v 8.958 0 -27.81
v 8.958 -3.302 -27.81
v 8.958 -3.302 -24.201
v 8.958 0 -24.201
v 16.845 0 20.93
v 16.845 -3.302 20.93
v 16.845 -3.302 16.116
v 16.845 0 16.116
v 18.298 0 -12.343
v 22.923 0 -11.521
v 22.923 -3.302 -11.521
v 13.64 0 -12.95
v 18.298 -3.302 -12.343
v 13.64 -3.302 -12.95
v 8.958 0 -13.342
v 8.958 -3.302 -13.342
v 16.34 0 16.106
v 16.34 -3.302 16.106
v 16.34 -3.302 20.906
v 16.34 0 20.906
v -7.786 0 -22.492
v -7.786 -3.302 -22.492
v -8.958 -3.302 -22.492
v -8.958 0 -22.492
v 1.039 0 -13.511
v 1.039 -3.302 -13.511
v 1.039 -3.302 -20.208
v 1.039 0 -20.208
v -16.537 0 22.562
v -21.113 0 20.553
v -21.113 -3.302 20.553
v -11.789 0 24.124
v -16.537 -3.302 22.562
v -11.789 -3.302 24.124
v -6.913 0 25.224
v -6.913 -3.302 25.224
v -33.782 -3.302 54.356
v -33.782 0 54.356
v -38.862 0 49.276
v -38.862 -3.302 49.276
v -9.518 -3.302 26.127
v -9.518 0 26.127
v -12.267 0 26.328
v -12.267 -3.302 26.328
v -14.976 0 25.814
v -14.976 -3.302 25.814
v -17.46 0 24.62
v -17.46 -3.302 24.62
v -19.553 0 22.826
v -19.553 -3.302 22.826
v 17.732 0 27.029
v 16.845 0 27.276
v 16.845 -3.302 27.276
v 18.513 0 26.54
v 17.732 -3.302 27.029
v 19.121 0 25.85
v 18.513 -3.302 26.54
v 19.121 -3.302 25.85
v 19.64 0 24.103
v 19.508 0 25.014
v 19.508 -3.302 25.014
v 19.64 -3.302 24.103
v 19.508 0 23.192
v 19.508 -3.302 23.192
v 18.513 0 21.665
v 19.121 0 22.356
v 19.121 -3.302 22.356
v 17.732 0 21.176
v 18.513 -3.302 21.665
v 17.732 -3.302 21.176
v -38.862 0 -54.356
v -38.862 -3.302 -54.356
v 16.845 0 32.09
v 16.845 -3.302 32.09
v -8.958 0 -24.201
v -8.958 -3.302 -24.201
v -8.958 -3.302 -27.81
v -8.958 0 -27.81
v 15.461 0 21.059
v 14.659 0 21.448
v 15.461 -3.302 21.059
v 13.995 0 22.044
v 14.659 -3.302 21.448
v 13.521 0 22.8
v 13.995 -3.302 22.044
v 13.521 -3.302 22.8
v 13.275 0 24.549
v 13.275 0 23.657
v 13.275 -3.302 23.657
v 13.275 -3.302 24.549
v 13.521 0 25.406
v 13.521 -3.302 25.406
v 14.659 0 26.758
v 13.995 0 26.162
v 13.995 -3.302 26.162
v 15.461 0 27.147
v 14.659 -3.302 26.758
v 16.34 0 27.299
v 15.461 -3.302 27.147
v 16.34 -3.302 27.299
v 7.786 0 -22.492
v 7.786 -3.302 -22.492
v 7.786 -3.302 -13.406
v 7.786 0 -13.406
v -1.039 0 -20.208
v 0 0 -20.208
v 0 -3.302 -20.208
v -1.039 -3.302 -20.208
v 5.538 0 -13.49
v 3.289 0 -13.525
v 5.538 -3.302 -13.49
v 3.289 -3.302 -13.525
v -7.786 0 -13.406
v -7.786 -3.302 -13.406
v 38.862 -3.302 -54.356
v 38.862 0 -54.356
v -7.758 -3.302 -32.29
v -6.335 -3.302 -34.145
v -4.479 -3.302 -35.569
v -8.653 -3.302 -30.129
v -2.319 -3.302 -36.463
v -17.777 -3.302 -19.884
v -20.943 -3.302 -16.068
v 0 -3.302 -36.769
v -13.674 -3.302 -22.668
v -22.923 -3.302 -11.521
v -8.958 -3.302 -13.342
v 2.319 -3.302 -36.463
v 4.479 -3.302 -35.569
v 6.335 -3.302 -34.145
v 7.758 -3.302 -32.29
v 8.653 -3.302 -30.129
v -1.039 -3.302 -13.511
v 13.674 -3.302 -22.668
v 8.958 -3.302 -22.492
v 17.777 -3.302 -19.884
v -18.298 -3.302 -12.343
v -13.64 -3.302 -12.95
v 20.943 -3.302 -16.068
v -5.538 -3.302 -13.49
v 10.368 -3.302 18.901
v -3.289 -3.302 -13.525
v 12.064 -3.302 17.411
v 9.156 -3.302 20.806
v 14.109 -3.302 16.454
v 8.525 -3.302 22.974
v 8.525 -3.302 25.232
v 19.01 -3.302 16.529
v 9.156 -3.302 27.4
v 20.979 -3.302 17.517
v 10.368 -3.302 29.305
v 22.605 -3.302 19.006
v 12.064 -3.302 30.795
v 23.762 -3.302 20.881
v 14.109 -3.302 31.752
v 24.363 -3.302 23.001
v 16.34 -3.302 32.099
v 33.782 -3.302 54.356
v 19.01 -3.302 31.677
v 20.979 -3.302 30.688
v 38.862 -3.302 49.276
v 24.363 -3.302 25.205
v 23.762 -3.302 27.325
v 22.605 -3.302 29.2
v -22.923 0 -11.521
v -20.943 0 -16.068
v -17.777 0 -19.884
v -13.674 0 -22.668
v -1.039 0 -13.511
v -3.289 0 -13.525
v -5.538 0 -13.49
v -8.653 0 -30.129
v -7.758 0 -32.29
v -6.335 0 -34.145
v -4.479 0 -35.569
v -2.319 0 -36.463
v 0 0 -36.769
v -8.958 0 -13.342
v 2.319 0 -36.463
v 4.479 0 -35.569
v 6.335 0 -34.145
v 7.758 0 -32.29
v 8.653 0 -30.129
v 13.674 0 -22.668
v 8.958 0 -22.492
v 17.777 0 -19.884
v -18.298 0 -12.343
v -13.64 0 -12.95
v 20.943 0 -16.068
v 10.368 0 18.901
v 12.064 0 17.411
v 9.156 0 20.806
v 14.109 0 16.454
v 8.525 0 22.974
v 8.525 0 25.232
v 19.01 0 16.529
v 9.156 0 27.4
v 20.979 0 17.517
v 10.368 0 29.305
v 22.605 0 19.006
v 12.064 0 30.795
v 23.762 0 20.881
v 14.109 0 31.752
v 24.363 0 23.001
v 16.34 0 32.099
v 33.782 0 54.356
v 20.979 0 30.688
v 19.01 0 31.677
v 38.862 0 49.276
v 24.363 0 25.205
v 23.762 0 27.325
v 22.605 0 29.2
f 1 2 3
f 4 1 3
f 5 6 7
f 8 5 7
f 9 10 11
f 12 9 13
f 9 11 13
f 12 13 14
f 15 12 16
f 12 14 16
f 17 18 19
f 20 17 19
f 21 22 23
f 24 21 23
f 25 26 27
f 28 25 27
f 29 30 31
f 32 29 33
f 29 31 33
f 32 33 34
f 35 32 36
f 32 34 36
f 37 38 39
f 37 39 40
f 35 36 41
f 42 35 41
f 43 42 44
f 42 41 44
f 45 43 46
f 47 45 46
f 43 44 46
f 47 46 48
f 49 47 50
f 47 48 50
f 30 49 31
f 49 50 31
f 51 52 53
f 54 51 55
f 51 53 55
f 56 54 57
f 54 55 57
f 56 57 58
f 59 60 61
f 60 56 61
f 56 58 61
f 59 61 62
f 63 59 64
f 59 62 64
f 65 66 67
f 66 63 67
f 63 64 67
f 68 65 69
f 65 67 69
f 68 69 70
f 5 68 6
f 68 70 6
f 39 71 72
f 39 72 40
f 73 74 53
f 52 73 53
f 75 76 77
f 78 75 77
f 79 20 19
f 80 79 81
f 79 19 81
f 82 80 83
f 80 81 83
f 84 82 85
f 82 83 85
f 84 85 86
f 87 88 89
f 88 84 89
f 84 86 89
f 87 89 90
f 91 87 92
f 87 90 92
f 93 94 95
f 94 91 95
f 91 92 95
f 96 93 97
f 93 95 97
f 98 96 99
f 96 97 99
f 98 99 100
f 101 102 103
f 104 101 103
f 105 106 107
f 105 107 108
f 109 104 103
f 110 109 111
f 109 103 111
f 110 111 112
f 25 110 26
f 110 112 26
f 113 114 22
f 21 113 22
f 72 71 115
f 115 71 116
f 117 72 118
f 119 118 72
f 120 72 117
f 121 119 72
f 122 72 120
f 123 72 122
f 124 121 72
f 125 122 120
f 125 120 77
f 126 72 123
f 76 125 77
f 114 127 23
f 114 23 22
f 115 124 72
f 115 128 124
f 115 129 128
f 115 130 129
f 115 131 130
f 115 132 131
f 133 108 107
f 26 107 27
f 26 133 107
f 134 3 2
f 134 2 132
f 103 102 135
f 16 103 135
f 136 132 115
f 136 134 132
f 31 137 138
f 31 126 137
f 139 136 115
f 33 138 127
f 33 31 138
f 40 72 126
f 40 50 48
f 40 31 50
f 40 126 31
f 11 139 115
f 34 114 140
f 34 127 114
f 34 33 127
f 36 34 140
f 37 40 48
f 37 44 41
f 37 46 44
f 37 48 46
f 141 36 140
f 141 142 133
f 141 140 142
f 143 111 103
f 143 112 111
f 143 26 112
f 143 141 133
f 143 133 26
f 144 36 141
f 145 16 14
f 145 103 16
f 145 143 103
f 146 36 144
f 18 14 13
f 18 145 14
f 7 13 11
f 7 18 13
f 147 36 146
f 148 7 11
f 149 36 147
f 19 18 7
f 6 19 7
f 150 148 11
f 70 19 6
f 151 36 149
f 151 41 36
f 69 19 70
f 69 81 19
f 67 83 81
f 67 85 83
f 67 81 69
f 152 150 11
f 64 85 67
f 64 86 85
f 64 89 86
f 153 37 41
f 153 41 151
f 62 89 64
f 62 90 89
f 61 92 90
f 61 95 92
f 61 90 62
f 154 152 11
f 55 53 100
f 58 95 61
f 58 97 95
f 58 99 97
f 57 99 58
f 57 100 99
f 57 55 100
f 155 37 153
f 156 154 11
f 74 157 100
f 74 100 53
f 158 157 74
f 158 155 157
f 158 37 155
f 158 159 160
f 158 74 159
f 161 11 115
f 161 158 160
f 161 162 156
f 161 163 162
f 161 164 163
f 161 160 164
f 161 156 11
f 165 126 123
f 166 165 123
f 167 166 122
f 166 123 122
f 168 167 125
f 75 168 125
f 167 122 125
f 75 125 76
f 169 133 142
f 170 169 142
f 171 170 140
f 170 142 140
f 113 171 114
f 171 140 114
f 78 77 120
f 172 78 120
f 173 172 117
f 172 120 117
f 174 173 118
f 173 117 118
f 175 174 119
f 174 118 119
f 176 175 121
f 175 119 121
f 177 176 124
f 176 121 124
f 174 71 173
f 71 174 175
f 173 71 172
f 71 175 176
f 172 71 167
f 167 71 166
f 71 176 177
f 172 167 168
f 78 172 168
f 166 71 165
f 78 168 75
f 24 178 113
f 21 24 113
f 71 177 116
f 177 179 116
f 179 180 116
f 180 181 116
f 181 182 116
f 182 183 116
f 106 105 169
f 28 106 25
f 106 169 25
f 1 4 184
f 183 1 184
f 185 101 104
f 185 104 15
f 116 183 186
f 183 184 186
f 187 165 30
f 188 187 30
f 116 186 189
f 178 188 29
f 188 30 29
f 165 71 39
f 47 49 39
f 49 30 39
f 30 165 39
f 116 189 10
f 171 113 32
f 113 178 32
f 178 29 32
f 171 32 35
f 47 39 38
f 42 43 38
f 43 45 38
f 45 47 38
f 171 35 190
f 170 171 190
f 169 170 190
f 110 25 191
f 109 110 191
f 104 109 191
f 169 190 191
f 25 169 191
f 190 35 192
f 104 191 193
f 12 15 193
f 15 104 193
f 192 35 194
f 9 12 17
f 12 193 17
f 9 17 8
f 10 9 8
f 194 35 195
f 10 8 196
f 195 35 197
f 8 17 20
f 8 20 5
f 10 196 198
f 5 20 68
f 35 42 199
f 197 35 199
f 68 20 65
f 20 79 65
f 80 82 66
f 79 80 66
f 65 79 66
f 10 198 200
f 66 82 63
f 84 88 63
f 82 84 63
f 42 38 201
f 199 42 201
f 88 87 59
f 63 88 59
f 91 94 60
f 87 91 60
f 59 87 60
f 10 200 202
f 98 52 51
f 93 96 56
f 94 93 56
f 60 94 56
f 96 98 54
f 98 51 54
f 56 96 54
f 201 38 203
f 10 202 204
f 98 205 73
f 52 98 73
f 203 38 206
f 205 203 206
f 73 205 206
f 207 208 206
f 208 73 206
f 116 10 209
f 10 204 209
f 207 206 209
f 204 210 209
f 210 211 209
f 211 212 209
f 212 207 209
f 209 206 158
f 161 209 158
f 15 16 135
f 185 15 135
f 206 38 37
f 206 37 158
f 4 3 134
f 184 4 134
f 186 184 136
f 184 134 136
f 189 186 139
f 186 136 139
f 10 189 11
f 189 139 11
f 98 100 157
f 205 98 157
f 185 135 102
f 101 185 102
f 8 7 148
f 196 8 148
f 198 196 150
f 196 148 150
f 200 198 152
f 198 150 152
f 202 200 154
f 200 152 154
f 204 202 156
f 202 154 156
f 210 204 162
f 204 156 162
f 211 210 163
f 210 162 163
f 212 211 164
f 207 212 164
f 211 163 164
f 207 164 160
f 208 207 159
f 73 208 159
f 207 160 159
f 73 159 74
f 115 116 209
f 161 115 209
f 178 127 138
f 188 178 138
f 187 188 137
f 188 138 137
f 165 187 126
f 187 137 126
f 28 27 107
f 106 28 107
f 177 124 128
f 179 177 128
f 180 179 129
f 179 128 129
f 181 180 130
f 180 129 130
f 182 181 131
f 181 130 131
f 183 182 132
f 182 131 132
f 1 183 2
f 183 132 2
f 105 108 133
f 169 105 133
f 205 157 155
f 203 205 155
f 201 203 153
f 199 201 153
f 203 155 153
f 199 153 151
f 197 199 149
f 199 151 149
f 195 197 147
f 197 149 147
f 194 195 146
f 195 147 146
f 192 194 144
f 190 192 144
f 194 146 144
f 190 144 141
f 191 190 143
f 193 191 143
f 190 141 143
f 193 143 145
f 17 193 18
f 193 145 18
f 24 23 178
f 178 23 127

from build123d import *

# Parameters (mm, degrees)
F0_W     = 77.724
F0_H     = 108.712
F1_DEPTH = 3.302
F3_R     = 13.3445871966
F4_DEPTH = 3.302
F5_SIZE  = 5.08
F7_DEPTH = 3.303


with BuildPart() as f1:
    # F0 (on Front) → F1 (new body)
    with BuildSketch(Plane.XZ):
        Rectangle(F0_W, F0_H)
    extrude(amount=F1_DEPTH)

    # F3 (on face) → F4 (join)
    with BuildSketch(Plane.XZ.offset(3.302)):
        with BuildLine():
            add(Edge.make_bspline(
                [(-33.1284857231, -24.3833554431), (-30.3980902484, -23.448268281), (-27.6625298974, -23.0135580616), (-24.9168122419, -22.8877504962)],
                knots=[0.0236239796, 0.0236239796, 0.0236239796, 0.0236239796, 0.1438563975, 0.1438563975, 0.1438563975, 0.1438563975], degree=3))
            ThreePointArc((-33.1284857231, -24.3833554431), (-29.1410849834, -38.4326879001), (-15.8749999992, -44.5395771521))
            ThreePointArc((-15.8749999992, -44.5395771521), (-7.7803065213, -45.3411097626), (9e-10, -47.7145771515))
            ThreePointArc((9e-10, -47.7145771515), (7.780306523, -45.3411097624), (15.8750000008, -44.5395771515))
            ThreePointArc((15.8750000008, -44.5395771515), (28.9710149024, -38.6284104056), (33.2008619827, -24.8968448621))
            add(Edge.make_bspline(
                [(22.7832318895, -28.264905571), (26.870414184, -28.3483991479), (30.7081117423, -27.7740633769), (33.2008619827, -24.8968448621)],
                knots=[0.8224951004, 0.8224951004, 0.8224951004, 0.8224951004, 0.9908039431, 0.9908039431, 0.9908039431, 0.9908039431], degree=3))
            add(Edge.make_bspline(
                [(15.9953683619, -27.7933645546), (16.7598950609, -27.862629463), (19.0104314318, -28.0581684328), (21.3052242348, -28.2347126075), (22.7832318895, -28.264905571)],
                knots=[0.7300371536, 0.7300371536, 0.7300371536, 0.7300371536, 0.7616312241, 0.8224951004, 0.8224951004, 0.8224951004, 0.8224951004], degree=3))
            add(Edge.make_bspline(
                [(12.0445173218, -27.4086319137), (13.3501324037, -27.5450763369), (14.6659309282, -27.6729196282), (15.9953683619, -27.7933645546)],
                knots=[0.6750981435, 0.6750981435, 0.6750981435, 0.6750981435, 0.7300371536, 0.7300371536, 0.7300371536, 0.7300371536], degree=3))
            add(Edge.make_bspline(
                [(6.5035843618, -26.7679947406), (8.3365045469, -27.0014140297), (10.1801283043, -27.2137923413), (12.0445173218, -27.4086319137)],
                knots=[0.5966464709, 0.5966464709, 0.5966464709, 0.5966464709, 0.6750981435, 0.6750981435, 0.6750981435, 0.6750981435], degree=3))
            add(Edge.make_bspline(
                [(-15.7821923495, -23.3437299796), (-10.5480047667, -23.9624284424), (-3.1004870846, -25.4363431139), (4.3262408996, -26.490713729), (6.5035843618, -26.7679947406)],
                knots=[0.2765511336, 0.2765511336, 0.2765511336, 0.2765511336, 0.5034529768, 0.5966464709, 0.5966464709, 0.5966464709, 0.5966464709], degree=3))
            add(Edge.make_bspline(
                [(-24.9168122419, -22.8877504962), (-22.5127229742, -22.777596192), (-19.4725911361, -22.9372512735), (-16.4147628171, -23.2689580365), (-15.7821923495, -23.3437299796)],
                knots=[0.1438563975, 0.1438563975, 0.1438563975, 0.1438563975, 0.2491292266, 0.2765511336, 0.2765511336, 0.2765511336, 0.2765511336], degree=3))
        make_face()
        with BuildLine():
            ThreePointArc((-24.3962783332, -9.4429305632), (-23.5493439512, -16.2082072875), (-24.9168122419, -22.8877504962))
            add(Edge.make_bspline(
                [(-24.9168122419, -22.8877504962), (-22.5127229742, -22.777596192), (-19.4725911361, -22.9372512735), (-16.4147628171, -23.2689580365), (-15.7821923495, -23.3437299796)],
                knots=[0.1438563975, 0.1438563975, 0.1438563975, 0.1438563975, 0.2491292266, 0.2765511336, 0.2765511336, 0.2765511336, 0.2765511336], degree=3))
            ThreePointArc((-15.7821923495, -23.3437299796), (-16.7909764629, -16.1431204561), (-15.7821923495, -8.9425109327))
            add(Edge.make_bspline(
                [(-20.8150930703, 3.0249084812), (-20.084698855, 3.2617064252), (-18.5750809579, 3.7511331524), (-20.1108934357, 5.7423249077), (-21.3989497629, 8.4805039988), (-19.5926222129, 8.6232034417), (-20.0960081308, 6.4882204736), (-17.9845367, 4.4717269755), (-19.4827279307, 7.4877563676), (-17.6531933794, 7.9935220173), (-17.6518746238, 3.7165445405), (-19.7201607312, 2.5442912986), (-19.0033211234, 0.5113026434), (-21.5358089244, 0.646088536), (-20.7796208818, -5.7027505195), (-14.9489180074, 0.0978196974), (-17.977030073, 1.5236381763), (-14.9168721562, 2.6666255778), (-16.1211586732, 6.3598723413), (-13.8328776174, 5.6005762962), (-15.1421128769, 3.3154322822), (-14.4747759607, 0.1624480587), (-13.8084140261, 5.1188240441), (-11.0343102947, 2.7331078221), (-14.5615723999, -0.162479085), (-17.3031216925, -3.3366762112), (-18.0975664008, -8.8898410691), (-13.4356882131, -5.5746333853), (-15.3648709473, -3.8082111356), (-12.0527139611, -3.6659211986), (-13.248535603, -1.079337143), (-9.5910344453, -1.7447413323), (-10.7422685487, 3.0079941618), (-8.9849464366, -1.96339633), (-8.8102943074, 5.4988116301), (-7.4861779197, -0.6957485248), (-9.6724060403, -0.966318494), (-11.0218385517, -3.5291741027), (-13.7004320012, -4.2797101397), (-12.8029593717, -6.9381020727), (-14.7089673153, -8.2196946287), (-15.7821923495, -8.9425109327)],
                knots=[0, 0, 0, 0, 0.0231511603, 0.0478500744, 0.0752755755, 0.0903366321, 0.1142638791, 0.1352244444, 0.1593040946, 0.1744947233, 0.2060790631, 0.2315955315, 0.2516703156, 0.2733460952, 0.3049833457, 0.3431527772, 0.3650886659, 0.3896180862, 0.4183185893, 0.4354180503, 0.4626318971, 0.4841465121, 0.512674348, 0.5346264378, 0.5675595767, 0.6056671213, 0.6368592747, 0.6681518224, 0.6879987795, 0.7121233264, 0.7334743783, 0.7591560932, 0.7848708559, 0.8073025156, 0.8374341523, 0.8673194844, 0.8904493251, 0.9187369989, 0.9444600919, 0.9686867066, 1, 1, 1, 1], degree=3))
            add(Edge.make_bspline(
                [(-25.8914344013, -2.4853385985), (-26.396572956, -2.0003344615), (-27.3138435109, -1.1196261405), (-29.1352849859, -2.0598979002), (-28.7106271057, 0.8204026064), (-32.0312644098, -1.1715068103), (-31.3002695814, 3.7485837155), (-29.4483178555, 3.8301118075), (-30.8071023081, 1.5653871303), (-28.9526334159, 1.3619840648), (-29.4792210737, 5.2085047756), (-26.921055424, 4.4342075194), (-28.8119762327, 2.2854028303), (-27.5906596289, -1.3990701213), (-27.7699356497, 3.0747016102), (-25.2099586785, 2.6066763518), (-26.5953437573, -0.395391095), (-23.7025988652, -2.0340069969), (-23.1772681034, -6.0499515041), (-20.5435134821, -4.1808959475), (-25.0748704565, 2.6489737746), (-20.1368344266, 0.7949418705), (-20.6048167244, 2.3336418411), (-20.8150930703, 3.0249084812)],
                knots=[0, 0, 0, 0, 0.0457250435, 0.0830311605, 0.1245988121, 0.1705511092, 0.2321726775, 0.2625557415, 0.30723362, 0.3358214151, 0.393012377, 0.4286583434, 0.4808472993, 0.5282384525, 0.5813000538, 0.6192860311, 0.6705302416, 0.7286736986, 0.7872738172, 0.8280557864, 0.9074882994, 0.958434574, 1, 1, 1, 1], degree=3))
            ThreePointArc((-25.8914344013, -2.4853385985), (-24.9290967698, -4.9824855111), (-24.3962783332, -7.6050683856))
            add(Edge.make_bspline(
                [(-24.3962783332, -9.4429305632), (-25.4357243907, -10.1342055857), (-27.412273175, -11.4486922391), (-27.4547789496, -7.4214675852), (-30.5466070306, -9.5733915774), (-30.4542370334, -5.4520792207), (-32.3177618611, -5.8417990903), (-32.7140680164, -4.2769830225), (-32.0543630337, -2.7007935171), (-32.1251676799, -4.5533058245), (-30.3843482976, -5.4648837492), (-32.0501040037, -1.6640768267), (-30.4436660674, -1.9005229869), (-30.1720801803, -6.5942041642), (-29.7456686663, -3.178537531), (-28.1334595609, -3.5814958653), (-29.8697325683, -5.6494579394), (-29.5018476184, -7.7306733995), (-27.2359049314, -6.3250302911), (-26.4788550338, -9.3239236743), (-25.0993332141, -8.1853413666), (-24.3962783332, -7.6050683856)],
                knots=[0, 0, 0, 0, 0.0670169121, 0.1274354192, 0.1840138636, 0.2505621343, 0.2960523516, 0.3441354147, 0.3840734056, 0.4287810373, 0.4665753725, 0.5348972739, 0.5667760176, 0.6369485958, 0.6883070256, 0.7231632661, 0.7842390879, 0.8324575559, 0.8851485442, 0.9414679355, 1, 1, 1, 1], degree=3))
        make_face()
        with BuildLine():
            add(Edge.make_bspline(
                [(-20.2924981713, -15.781018883), (-20.5370775999, -16.1379246214), (-20.134132622, -17.1534868603), (-20.8639151565, -18.5661521393), (-21.9358468203, -19.4575377926), (-22.3700864307, -21.8865095148), (-20.237349518, -21.5763362209), (-19.5672362136, -20.438180371), (-19.2965010699, -18.8033454883), (-19.7803037906, -17.8720601229), (-19.908738804, -16.4540465799), (-19.0188083322, -15.0649598827), (-20.0853771822, -15.4787748635), (-20.2924981713, -15.781018883)],
                knots=[0, 0, 0, 0, 0.0904118203, 0.1854248684, 0.2814922978, 0.3865094541, 0.4809925493, 0.5711470892, 0.6690619631, 0.748512495, 0.8439845899, 0.9234351565, 1, 1, 1, 1], degree=3))
        make_face(mode=Mode.SUBTRACT)
        with BuildLine():
            add(Edge.make_bspline(
                [(-22.3910957575, -11.5529615432), (-22.0568118654, -12.2037220004), (-21.1170784891, -12.8832887919), (-21.7129777335, -14.1967346716), (-20.5379115522, -14.568750962), (-20.4867607869, -13.5076873001), (-20.8432701563, -11.8831681267), (-21.6439811905, -11.2404808042), (-22.9718655512, -9.3501247732), (-22.6978835435, -10.9557285785), (-22.3910957575, -11.5529615432)],
                knots=[0, 0, 0, 0, 0.1505340204, 0.2658311351, 0.3614801071, 0.4617187858, 0.6051372816, 0.7298931385, 0.8618479683, 1, 1, 1, 1], degree=3))
        make_face(mode=Mode.SUBTRACT)
        with BuildLine():
            add(Edge.make_bspline(
                [(-18.3790698647, -10.1024601609), (-18.7969421772, -10.2564427963), (-19.1553590595, -11.577398565), (-19.219348267, -12.6506630096), (-19.2408550579, -13.9350019391), (-18.8743899715, -14.8858473731), (-18.2833235222, -14.0155234153), (-18.1315989973, -13.0706647968), (-18.7065283271, -12.3462231403), (-18.4694817034, -11.2210464666), (-17.1590443019, -10.374237249), (-18.0760721444, -9.9908079022), (-18.3790698647, -10.1024601609)],
                knots=[0, 0, 0, 0, 0.1240572212, 0.2333232805, 0.347818092, 0.428679644, 0.5131510602, 0.6107152668, 0.7012679009, 0.8047604962, 0.9100465523, 1, 1, 1, 1], degree=3))
        make_face(mode=Mode.SUBTRACT)
        with BuildLine():
            ThreePointArc((5.4403450859, -12.5461180708), (6.6092683485, -19.609411059), (6.5035843618, -26.7679947406))
            add(Edge.make_bspline(
                [(6.5035843618, -26.7679947406), (8.3365045469, -27.0014140297), (10.1801283043, -27.2137923413), (12.0445173218, -27.4086319137)],
                knots=[0.5966464709, 0.5966464709, 0.5966464709, 0.5966464709, 0.6750981435, 0.6750981435, 0.6750981435, 0.6750981435], degree=3))
            Line((12.0445173218, -27.4086319137), (12.0445173218, -21.4756764472))
            ThreePointArc((12.0445173218, -21.4756764472), (14.0199428419, -19.5002509271), (15.9953683619, -21.4756764472))
            Line((15.9953683619, -21.4756764472), (15.9953683619, -27.7933645546))
            add(Edge.make_bspline(
                [(15.9953683619, -27.7933645546), (16.7598950609, -27.862629463), (19.0104314318, -28.0581684328), (21.3052242348, -28.2347126075), (22.7832318895, -28.264905571)],
                knots=[0.7300371536, 0.7300371536, 0.7300371536, 0.7300371536, 0.7616312241, 0.8224951004, 0.8224951004, 0.8224951004, 0.8224951004], degree=3))
            ThreePointArc((22.7832318895, -28.264905571), (22.4736636829, -20.3696155623), (23.5801553445, -12.5461180708))
            Line((23.5801553445, -12.5461180708), (28.4554600831, -13.4531514135))
            ThreePointArc((28.4554600831, -13.4531514135), (31.673336573, -11.9989868814), (31.424967593, -8.4765393743))
            ThreePointArc((31.424967593, -8.4765393743), (29.2529740879, -8.2440657168), (29.0205004305, -10.4160592219))
            ThreePointArc((29.0205004305, -10.4160592219), (29.058069024, -11.9208265797), (27.614886003, -12.3485636115))
            ThreePointArc((27.614886003, -12.3485636115), (23.4712314741, -5.8636115848), (28.4554600831, 0))
            ThreePointArc((28.4554600831, 0), (23.3706331923, -0.6006945639), (18.2612345592, -0.9328753515))
            Line((18.2612345592, -0.9328753515), (21.109645709, 8.6648291047))
            Line((21.109645709, 8.6648291047), (22.7452469365, 8.179414619))
            ThreePointArc((22.7452469365, 8.179414619), (24.0675287583, 9.9087492795), (21.9295363303, 9.4988517773))
            ThreePointArc((21.9295363303, 9.4988517773), (17.0915933325, 15.0640837031), (15.5871994793, 22.2831070423))
            Line((15.5871994793, 22.2831070423), (14.8853833456, 29.6840668302))
            Line((14.8853833456, 29.6840668302), (17.9889984262, 30.165095753))
            Line((17.9889984262, 30.165095753), (17.720128815, 31.8998516907))
            Line((17.720128815, 31.8998516907), (14.8043116011, 31.4479295364))
            Line((14.8043116011, 31.4479295364), (14.2361351446, 35.1138234881))
            Line((14.2361351446, 35.1138234881), (12.1174789965, 34.7854532301))
            Line((12.1174789965, 34.7854532301), (12.6562453806, 31.3093140721))
            Line((12.6562453806, 31.3093140721), (10.0379107516, 30.7162171018))
            Line((10.0379107516, 30.7162171018), (10.2517836951, 29.4975203391))
            Line((10.2517836951, 29.4975203391), (12.7509497106, 29.9361068755))
            Line((12.7509497106, 29.9361068755), (14.0939988196, 22.2831070423))
            ThreePointArc((14.0939988196, 22.2831070423), (12.6245914015, 15.2177663733), (7.6988285058, 9.9437681912))
            ThreePointArc((7.6988285058, 9.9437681912), (5.5906171254, 10.4864212664), (6.8022884056, 8.6778637491))
            Line((6.8022884056, 8.6778637491), (8.4650181234, 9.060157463))
            Line((8.4650181234, 9.060157463), (10.762639533, -0.9330055424))
            ThreePointArc((10.762639533, -0.9330055424), (5.6515483018, -0.6008483836), (0.5650403473, 0))
            ThreePointArc((0.5650403473, 0), (5.5492689564, -5.8636115848), (1.4056144274, -12.3485636115))
            ThreePointArc((1.4056144274, -12.3485636115), (-0.0375685935, -11.9208265797), (0, -10.4160592219))
            ThreePointArc((0, -10.4160592219), (-0.2324736575, -8.2440657168), (-2.4044671625, -8.4765393743))
            ThreePointArc((-2.4044671625, -8.4765393743), (-2.6528361426, -11.9989868814), (0.5650403473, -13.4531514135))
            Line((0.5650403473, -13.4531514135), (5.4403450859, -12.5461180708))
        make_face()
        Polygon((9.1227404773, -7.4148867279), (8.4774624556, -4.9826856703), (9.749203307, -4.868891682), (10.3401336819, -7.1323132142), align=None, mode=Mode.SUBTRACT)
        Polygon((10.9397291529, -9.5362256838), (9.768018499, -9.8470877856), (9.2899553012, -8.0451578014), (10.461665955, -7.7342956997), align=None, mode=Mode.SUBTRACT)
        Polygon((12.2584053658, -7.3401992658), (12.7159978886, -9.0649705743), (11.5734964264, -9.3680832964), (11.1159039036, -7.6433119879), align=None, mode=Mode.SUBTRACT)
        Polygon((10.332212454, -4.8167246576), (11.5597705233, -4.7068840966), (12.1378842059, -6.8859273354), (10.9000811353, -7.0559568703), align=None, mode=Mode.SUBTRACT)
        Polygon((17.9045965268, -7.6433119879), (17.4470040041, -9.3680832964), (16.3045025419, -9.0649705743), (16.7620950646, -7.3401992658), align=None, mode=Mode.SUBTRACT)
        Polygon((18.5588344754, -7.7342956997), (19.7305451293, -8.0451578014), (19.2524819314, -9.8470877856), (18.0807712776, -9.5362256838), align=None, mode=Mode.SUBTRACT)
        Polygon((18.6803667486, -7.1323132142), (19.2712971234, -4.868891682), (20.5430379748, -4.9826856703), (19.8977599531, -7.4148867279), align=None, mode=Mode.SUBTRACT)
        Polygon((16.8826162245, -6.8859273354), (17.4607299071, -4.7068840966), (18.6882879764, -4.8167246576), (18.1204192951, -7.0559568703), align=None, mode=Mode.SUBTRACT)
        with BuildLine():
            ThreePointArc((14.2767767446, 4.6611620079), (12.1414040207, 5.7303494735), (11.1097303552, 7.8840968947))
            Line((11.1097303552, 7.8840968947), (14.2767767446, 7.8840968947))
            Line((14.2767767446, 7.8840968947), (14.2767767446, 4.6611620079))
        make_face(mode=Mode.SUBTRACT)
        with BuildLine():
            ThreePointArc((11.1459939594, 8.983289175), (12.2280091457, 10.9819830574), (14.2767767446, 11.9658963789))
            Line((14.2767767446, 11.9658963789), (14.2767767446, 8.983289175))
            Line((14.2767767446, 8.983289175), (11.1459939594, 8.983289175))
        make_face(mode=Mode.SUBTRACT)
        with BuildLine():
            ThreePointArc((18.430607267, 7.8840968947), (17.3673699452, 5.6986165643), (15.1747141111, 4.6502567644))
            Line((15.1747141111, 4.6502567644), (15.1747141111, 7.8840968947))
            Line((15.1747141111, 7.8840968947), (18.430607267, 7.8840968947))
        make_face(mode=Mode.SUBTRACT)
        with BuildLine():
            ThreePointArc((15.1747141111, 11.9768016224), (17.2797356479, 11.0126579566), (18.3943436628, 8.983289175))
            Line((18.3943436628, 8.983289175), (15.1747141111, 8.983289175))
            Line((15.1747141111, 8.983289175), (15.1747141111, 11.9768016224))
        make_face(mode=Mode.SUBTRACT)
        with BuildLine():
            ThreePointArc((1.5084841621, 28.7364097307), (5.1963193944, 39.8156504287), (15.8749999992, 44.5395771521))
            ThreePointArc((15.8749999992, 44.5395771521), (7.7803065213, 45.3411097626), (-9e-10, 47.7145771515))
            ThreePointArc((-9e-10, 47.7145771515), (-7.780306523, 45.3411097624), (-15.8750000008, 44.5395771515))
            ThreePointArc((-15.8750000008, 44.5395771515), (-30.2008361805, 37.0625327748), (-32.2586794783, 21.0343995142))
            ThreePointArc((-32.2586794783, 21.0343995142), (-31.4618060576, 11.8664205536), (-35.4362714152, 3.5663922047))
            ThreePointArc((-35.4362714152, 3.5663922047), (-26.8661908779, 8.4248419398), (-17.0921185192, 9.6570447531))
            ThreePointArc((-17.0921185192, 9.6570447531), (-3.3712650978, 14.8871009528), (1.5084841621, 28.7364097307))
        make_face()
        with Locations((-15.8750000008, 27.0770771515)):
            Circle(F3_R, mode=Mode.SUBTRACT)
    extrude(amount=-F4_DEPTH)

    # F5
    f5_edges = [f1.edges().sort_by_distance(p)[0] for p in [
        (-38.862, -1.651, 54.356),
        (38.862, -1.651, 54.356),
    ]]
    chamfer(f5_edges, length=F5_SIZE)

    # F6 (on face) → F7 (cut, through all)
    with BuildSketch(Plane.XZ.offset(3.302)):
        with BuildLine():
            ThreePointArc((-21.1133435369, 20.5527991056), (-14.1814466186, 23.3995616628), (-6.9132223725, 25.2238884568))
            ThreePointArc((-6.9132223725, 25.2238884568), (-14.9756572058, 25.8139634695), (-21.1133435369, 20.5527991056))
        make_face()
        with BuildLine():
            Line((16.3396615535, 27.2994334483), (16.3396615535, 32.0994301496))
            ThreePointArc((16.3396615535, 32.0994301496), (8.4449732872, 24.1028293967), (16.3396615535, 16.1062286438))
            Line((16.3396615535, 16.1062286438), (16.3396615535, 20.9062253451))
            ThreePointArc((16.3396615535, 20.9062253451), (13.2439826058, 24.1028293967), (16.3396615535, 27.2994334483))
        make_face()
        with BuildLine():
            ThreePointArc((16.8452393264, 16.1157317246), (24.4394903807, 24.1028293967), (16.8452393264, 32.0899270689))
            Line((16.8452393264, 32.0899270689), (16.8452393264, 27.2755857829))
            ThreePointArc((16.8452393264, 27.2755857829), (19.640481062, 24.1028293967), (16.8452393264, 20.9300730105))
            Line((16.8452393264, 20.9300730105), (16.8452393264, 16.1157317246))
        make_face()
        with BuildLine():
            ThreePointArc((7.7858120203, -13.4056184413), (4.4132785994, -13.5141144888), (1.0390022352, -13.5106380834))
            Line((1.0390022352, -13.5106380834), (1.0390022352, -20.207516849))
            Line((1.0390022352, -20.207516849), (0, -20.207516849))
            Line((8e-10, -20.207516849), (-1.0390022345, -20.2075168491))
            Line((-1.0390022345, -20.2075168491), (-1.0390022347, -13.5106380835))
            ThreePointArc((-1.0390022347, -13.5106380835), (-4.4132785989, -13.514114489), (-7.7858120198, -13.4056184416))
            Line((-7.7858120198, -13.4056184416), (-7.7858120195, -22.4921759221))
            Line((-7.7858120195, -22.4921759221), (-8.9584118489, -22.4921759221))
            Line((-8.9584118489, -22.4921759221), (-8.9584118492, -13.3416137406))
            ThreePointArc((-8.9584118492, -13.3416137406), (-15.9722408444, -12.673568077), (-22.9229629035, -11.5213766703))
            ThreePointArc((-22.9229629035, -11.5213766703), (-17.7771825477, -19.8838721478), (-8.9584118488, -24.2012404948))
            Line((-8.9584118488, -24.2012404948), (-8.9584118487, -27.8103052275))
            ThreePointArc((-8.9584118487, -27.8103052275), (-6.3345537663, -34.144858995), (1.4e-09, -36.7687170769))
            ThreePointArc((0, -36.7687170769), (6.3345537676, -34.1448589948), (8.9584118497, -27.8103052271))
            Line((8.9584118497, -27.8103052271), (8.9584118497, -24.2012404944))
            ThreePointArc((8.9584118497, -24.2012404944), (17.7771825485, -19.8838721472), (22.922962904, -11.5213766694))
            ThreePointArc((22.922962904, -11.5213766694), (15.9722408449, -12.6735680764), (8.9584118497, -13.3416137402))
            Line((8.9584118497, -13.3416137402), (8.9584118497, -22.4921759218))
            Line((8.9584118497, -22.4921759218), (7.7858120203, -22.4921759218))
            Line((7.7858120203, -22.4921759218), (7.7858120203, -13.4056184413))
        make_face()
    extrude(amount=-F7_DEPTH, mode=Mode.SUBTRACT)


solid = f1.part
